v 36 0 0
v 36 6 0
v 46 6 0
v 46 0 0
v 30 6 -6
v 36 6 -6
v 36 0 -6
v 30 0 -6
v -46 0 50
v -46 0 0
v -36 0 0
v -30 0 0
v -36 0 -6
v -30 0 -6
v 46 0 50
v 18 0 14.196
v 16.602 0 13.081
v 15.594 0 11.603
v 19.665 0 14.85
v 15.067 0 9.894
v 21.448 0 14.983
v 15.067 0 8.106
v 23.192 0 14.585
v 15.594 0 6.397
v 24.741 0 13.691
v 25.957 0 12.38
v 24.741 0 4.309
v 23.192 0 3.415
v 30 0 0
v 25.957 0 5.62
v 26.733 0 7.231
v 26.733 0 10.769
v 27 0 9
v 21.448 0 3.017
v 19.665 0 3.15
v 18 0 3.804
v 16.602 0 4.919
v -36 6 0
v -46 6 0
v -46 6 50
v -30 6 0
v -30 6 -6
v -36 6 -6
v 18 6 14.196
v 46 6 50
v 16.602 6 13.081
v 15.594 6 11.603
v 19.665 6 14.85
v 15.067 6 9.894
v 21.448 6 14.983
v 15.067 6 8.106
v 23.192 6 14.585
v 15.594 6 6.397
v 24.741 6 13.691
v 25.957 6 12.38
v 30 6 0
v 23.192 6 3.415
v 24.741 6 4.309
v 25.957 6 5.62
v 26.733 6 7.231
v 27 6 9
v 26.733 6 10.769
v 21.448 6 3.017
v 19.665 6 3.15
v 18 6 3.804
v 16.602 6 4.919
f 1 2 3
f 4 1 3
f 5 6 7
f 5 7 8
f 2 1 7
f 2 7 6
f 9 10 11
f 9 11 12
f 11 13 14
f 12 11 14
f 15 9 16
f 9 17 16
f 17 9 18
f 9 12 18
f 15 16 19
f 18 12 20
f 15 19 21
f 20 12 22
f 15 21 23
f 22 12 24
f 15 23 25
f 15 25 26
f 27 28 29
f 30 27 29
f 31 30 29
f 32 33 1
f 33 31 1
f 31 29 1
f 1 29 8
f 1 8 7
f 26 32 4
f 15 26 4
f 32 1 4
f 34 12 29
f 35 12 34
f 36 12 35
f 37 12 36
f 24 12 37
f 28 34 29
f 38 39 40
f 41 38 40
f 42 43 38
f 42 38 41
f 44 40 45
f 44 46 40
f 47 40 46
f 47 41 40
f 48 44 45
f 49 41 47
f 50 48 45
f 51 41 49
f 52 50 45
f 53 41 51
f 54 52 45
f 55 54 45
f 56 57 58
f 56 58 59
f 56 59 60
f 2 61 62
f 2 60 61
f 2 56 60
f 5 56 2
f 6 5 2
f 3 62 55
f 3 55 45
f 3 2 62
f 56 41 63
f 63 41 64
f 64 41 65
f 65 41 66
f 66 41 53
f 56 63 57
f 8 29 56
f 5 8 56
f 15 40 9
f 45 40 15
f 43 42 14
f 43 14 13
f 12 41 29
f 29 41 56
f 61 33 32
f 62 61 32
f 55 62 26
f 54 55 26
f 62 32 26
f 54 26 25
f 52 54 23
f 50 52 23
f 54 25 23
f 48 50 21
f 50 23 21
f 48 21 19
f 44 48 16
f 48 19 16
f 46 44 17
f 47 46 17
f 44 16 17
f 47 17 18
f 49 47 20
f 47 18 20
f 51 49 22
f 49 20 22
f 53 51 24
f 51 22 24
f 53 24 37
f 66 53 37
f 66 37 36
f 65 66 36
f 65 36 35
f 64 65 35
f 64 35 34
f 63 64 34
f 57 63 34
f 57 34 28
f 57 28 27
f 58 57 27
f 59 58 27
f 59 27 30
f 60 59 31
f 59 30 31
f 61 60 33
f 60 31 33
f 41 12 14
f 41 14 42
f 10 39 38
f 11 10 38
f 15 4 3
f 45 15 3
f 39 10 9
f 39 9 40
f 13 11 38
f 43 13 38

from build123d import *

# Parameters (mm, degrees)
SKETCH1_W           = 92
SKETCH1_H           = 6
BOSS_EXTRUDE1_DEPTH = 50
SKETCH2_W           = 6
SKETCH2_H           = 6
BOSS_EXTRUDE2_DEPTH = 6
SKETCH3_R           = 6
CUT_EXTRUDE1_DEPTH  = 6


with BuildPart() as part:
    # Sketch1 → Boss-Extrude1 (new body)
    with BuildSketch(Plane.XY):
        with Locations((0, 3)):
            Rectangle(SKETCH1_W, SKETCH1_H)
    extrude(amount=BOSS_EXTRUDE1_DEPTH)

    # Sketch2 → Boss-Extrude2 (add)
    with BuildSketch(Plane(origin=(0, 0, 0), x_dir=(-1, 0, 0), z_dir=(0, 0, -1))):
        with Locations((-33, 3)):
            Rectangle(SKETCH2_W, SKETCH2_H)
        with Locations((33, 3)):
            Rectangle(SKETCH2_W, SKETCH2_H)
    extrude(amount=BOSS_EXTRUDE2_DEPTH)

    # Sketch3 → Cut-Extrude1 (cut)
    with BuildSketch(Plane.XZ):
        with Locations((21, 9)):
            Circle(SKETCH3_R)
    extrude(amount=-CUT_EXTRUDE1_DEPTH, mode=Mode.SUBTRACT)


solid = part.part
